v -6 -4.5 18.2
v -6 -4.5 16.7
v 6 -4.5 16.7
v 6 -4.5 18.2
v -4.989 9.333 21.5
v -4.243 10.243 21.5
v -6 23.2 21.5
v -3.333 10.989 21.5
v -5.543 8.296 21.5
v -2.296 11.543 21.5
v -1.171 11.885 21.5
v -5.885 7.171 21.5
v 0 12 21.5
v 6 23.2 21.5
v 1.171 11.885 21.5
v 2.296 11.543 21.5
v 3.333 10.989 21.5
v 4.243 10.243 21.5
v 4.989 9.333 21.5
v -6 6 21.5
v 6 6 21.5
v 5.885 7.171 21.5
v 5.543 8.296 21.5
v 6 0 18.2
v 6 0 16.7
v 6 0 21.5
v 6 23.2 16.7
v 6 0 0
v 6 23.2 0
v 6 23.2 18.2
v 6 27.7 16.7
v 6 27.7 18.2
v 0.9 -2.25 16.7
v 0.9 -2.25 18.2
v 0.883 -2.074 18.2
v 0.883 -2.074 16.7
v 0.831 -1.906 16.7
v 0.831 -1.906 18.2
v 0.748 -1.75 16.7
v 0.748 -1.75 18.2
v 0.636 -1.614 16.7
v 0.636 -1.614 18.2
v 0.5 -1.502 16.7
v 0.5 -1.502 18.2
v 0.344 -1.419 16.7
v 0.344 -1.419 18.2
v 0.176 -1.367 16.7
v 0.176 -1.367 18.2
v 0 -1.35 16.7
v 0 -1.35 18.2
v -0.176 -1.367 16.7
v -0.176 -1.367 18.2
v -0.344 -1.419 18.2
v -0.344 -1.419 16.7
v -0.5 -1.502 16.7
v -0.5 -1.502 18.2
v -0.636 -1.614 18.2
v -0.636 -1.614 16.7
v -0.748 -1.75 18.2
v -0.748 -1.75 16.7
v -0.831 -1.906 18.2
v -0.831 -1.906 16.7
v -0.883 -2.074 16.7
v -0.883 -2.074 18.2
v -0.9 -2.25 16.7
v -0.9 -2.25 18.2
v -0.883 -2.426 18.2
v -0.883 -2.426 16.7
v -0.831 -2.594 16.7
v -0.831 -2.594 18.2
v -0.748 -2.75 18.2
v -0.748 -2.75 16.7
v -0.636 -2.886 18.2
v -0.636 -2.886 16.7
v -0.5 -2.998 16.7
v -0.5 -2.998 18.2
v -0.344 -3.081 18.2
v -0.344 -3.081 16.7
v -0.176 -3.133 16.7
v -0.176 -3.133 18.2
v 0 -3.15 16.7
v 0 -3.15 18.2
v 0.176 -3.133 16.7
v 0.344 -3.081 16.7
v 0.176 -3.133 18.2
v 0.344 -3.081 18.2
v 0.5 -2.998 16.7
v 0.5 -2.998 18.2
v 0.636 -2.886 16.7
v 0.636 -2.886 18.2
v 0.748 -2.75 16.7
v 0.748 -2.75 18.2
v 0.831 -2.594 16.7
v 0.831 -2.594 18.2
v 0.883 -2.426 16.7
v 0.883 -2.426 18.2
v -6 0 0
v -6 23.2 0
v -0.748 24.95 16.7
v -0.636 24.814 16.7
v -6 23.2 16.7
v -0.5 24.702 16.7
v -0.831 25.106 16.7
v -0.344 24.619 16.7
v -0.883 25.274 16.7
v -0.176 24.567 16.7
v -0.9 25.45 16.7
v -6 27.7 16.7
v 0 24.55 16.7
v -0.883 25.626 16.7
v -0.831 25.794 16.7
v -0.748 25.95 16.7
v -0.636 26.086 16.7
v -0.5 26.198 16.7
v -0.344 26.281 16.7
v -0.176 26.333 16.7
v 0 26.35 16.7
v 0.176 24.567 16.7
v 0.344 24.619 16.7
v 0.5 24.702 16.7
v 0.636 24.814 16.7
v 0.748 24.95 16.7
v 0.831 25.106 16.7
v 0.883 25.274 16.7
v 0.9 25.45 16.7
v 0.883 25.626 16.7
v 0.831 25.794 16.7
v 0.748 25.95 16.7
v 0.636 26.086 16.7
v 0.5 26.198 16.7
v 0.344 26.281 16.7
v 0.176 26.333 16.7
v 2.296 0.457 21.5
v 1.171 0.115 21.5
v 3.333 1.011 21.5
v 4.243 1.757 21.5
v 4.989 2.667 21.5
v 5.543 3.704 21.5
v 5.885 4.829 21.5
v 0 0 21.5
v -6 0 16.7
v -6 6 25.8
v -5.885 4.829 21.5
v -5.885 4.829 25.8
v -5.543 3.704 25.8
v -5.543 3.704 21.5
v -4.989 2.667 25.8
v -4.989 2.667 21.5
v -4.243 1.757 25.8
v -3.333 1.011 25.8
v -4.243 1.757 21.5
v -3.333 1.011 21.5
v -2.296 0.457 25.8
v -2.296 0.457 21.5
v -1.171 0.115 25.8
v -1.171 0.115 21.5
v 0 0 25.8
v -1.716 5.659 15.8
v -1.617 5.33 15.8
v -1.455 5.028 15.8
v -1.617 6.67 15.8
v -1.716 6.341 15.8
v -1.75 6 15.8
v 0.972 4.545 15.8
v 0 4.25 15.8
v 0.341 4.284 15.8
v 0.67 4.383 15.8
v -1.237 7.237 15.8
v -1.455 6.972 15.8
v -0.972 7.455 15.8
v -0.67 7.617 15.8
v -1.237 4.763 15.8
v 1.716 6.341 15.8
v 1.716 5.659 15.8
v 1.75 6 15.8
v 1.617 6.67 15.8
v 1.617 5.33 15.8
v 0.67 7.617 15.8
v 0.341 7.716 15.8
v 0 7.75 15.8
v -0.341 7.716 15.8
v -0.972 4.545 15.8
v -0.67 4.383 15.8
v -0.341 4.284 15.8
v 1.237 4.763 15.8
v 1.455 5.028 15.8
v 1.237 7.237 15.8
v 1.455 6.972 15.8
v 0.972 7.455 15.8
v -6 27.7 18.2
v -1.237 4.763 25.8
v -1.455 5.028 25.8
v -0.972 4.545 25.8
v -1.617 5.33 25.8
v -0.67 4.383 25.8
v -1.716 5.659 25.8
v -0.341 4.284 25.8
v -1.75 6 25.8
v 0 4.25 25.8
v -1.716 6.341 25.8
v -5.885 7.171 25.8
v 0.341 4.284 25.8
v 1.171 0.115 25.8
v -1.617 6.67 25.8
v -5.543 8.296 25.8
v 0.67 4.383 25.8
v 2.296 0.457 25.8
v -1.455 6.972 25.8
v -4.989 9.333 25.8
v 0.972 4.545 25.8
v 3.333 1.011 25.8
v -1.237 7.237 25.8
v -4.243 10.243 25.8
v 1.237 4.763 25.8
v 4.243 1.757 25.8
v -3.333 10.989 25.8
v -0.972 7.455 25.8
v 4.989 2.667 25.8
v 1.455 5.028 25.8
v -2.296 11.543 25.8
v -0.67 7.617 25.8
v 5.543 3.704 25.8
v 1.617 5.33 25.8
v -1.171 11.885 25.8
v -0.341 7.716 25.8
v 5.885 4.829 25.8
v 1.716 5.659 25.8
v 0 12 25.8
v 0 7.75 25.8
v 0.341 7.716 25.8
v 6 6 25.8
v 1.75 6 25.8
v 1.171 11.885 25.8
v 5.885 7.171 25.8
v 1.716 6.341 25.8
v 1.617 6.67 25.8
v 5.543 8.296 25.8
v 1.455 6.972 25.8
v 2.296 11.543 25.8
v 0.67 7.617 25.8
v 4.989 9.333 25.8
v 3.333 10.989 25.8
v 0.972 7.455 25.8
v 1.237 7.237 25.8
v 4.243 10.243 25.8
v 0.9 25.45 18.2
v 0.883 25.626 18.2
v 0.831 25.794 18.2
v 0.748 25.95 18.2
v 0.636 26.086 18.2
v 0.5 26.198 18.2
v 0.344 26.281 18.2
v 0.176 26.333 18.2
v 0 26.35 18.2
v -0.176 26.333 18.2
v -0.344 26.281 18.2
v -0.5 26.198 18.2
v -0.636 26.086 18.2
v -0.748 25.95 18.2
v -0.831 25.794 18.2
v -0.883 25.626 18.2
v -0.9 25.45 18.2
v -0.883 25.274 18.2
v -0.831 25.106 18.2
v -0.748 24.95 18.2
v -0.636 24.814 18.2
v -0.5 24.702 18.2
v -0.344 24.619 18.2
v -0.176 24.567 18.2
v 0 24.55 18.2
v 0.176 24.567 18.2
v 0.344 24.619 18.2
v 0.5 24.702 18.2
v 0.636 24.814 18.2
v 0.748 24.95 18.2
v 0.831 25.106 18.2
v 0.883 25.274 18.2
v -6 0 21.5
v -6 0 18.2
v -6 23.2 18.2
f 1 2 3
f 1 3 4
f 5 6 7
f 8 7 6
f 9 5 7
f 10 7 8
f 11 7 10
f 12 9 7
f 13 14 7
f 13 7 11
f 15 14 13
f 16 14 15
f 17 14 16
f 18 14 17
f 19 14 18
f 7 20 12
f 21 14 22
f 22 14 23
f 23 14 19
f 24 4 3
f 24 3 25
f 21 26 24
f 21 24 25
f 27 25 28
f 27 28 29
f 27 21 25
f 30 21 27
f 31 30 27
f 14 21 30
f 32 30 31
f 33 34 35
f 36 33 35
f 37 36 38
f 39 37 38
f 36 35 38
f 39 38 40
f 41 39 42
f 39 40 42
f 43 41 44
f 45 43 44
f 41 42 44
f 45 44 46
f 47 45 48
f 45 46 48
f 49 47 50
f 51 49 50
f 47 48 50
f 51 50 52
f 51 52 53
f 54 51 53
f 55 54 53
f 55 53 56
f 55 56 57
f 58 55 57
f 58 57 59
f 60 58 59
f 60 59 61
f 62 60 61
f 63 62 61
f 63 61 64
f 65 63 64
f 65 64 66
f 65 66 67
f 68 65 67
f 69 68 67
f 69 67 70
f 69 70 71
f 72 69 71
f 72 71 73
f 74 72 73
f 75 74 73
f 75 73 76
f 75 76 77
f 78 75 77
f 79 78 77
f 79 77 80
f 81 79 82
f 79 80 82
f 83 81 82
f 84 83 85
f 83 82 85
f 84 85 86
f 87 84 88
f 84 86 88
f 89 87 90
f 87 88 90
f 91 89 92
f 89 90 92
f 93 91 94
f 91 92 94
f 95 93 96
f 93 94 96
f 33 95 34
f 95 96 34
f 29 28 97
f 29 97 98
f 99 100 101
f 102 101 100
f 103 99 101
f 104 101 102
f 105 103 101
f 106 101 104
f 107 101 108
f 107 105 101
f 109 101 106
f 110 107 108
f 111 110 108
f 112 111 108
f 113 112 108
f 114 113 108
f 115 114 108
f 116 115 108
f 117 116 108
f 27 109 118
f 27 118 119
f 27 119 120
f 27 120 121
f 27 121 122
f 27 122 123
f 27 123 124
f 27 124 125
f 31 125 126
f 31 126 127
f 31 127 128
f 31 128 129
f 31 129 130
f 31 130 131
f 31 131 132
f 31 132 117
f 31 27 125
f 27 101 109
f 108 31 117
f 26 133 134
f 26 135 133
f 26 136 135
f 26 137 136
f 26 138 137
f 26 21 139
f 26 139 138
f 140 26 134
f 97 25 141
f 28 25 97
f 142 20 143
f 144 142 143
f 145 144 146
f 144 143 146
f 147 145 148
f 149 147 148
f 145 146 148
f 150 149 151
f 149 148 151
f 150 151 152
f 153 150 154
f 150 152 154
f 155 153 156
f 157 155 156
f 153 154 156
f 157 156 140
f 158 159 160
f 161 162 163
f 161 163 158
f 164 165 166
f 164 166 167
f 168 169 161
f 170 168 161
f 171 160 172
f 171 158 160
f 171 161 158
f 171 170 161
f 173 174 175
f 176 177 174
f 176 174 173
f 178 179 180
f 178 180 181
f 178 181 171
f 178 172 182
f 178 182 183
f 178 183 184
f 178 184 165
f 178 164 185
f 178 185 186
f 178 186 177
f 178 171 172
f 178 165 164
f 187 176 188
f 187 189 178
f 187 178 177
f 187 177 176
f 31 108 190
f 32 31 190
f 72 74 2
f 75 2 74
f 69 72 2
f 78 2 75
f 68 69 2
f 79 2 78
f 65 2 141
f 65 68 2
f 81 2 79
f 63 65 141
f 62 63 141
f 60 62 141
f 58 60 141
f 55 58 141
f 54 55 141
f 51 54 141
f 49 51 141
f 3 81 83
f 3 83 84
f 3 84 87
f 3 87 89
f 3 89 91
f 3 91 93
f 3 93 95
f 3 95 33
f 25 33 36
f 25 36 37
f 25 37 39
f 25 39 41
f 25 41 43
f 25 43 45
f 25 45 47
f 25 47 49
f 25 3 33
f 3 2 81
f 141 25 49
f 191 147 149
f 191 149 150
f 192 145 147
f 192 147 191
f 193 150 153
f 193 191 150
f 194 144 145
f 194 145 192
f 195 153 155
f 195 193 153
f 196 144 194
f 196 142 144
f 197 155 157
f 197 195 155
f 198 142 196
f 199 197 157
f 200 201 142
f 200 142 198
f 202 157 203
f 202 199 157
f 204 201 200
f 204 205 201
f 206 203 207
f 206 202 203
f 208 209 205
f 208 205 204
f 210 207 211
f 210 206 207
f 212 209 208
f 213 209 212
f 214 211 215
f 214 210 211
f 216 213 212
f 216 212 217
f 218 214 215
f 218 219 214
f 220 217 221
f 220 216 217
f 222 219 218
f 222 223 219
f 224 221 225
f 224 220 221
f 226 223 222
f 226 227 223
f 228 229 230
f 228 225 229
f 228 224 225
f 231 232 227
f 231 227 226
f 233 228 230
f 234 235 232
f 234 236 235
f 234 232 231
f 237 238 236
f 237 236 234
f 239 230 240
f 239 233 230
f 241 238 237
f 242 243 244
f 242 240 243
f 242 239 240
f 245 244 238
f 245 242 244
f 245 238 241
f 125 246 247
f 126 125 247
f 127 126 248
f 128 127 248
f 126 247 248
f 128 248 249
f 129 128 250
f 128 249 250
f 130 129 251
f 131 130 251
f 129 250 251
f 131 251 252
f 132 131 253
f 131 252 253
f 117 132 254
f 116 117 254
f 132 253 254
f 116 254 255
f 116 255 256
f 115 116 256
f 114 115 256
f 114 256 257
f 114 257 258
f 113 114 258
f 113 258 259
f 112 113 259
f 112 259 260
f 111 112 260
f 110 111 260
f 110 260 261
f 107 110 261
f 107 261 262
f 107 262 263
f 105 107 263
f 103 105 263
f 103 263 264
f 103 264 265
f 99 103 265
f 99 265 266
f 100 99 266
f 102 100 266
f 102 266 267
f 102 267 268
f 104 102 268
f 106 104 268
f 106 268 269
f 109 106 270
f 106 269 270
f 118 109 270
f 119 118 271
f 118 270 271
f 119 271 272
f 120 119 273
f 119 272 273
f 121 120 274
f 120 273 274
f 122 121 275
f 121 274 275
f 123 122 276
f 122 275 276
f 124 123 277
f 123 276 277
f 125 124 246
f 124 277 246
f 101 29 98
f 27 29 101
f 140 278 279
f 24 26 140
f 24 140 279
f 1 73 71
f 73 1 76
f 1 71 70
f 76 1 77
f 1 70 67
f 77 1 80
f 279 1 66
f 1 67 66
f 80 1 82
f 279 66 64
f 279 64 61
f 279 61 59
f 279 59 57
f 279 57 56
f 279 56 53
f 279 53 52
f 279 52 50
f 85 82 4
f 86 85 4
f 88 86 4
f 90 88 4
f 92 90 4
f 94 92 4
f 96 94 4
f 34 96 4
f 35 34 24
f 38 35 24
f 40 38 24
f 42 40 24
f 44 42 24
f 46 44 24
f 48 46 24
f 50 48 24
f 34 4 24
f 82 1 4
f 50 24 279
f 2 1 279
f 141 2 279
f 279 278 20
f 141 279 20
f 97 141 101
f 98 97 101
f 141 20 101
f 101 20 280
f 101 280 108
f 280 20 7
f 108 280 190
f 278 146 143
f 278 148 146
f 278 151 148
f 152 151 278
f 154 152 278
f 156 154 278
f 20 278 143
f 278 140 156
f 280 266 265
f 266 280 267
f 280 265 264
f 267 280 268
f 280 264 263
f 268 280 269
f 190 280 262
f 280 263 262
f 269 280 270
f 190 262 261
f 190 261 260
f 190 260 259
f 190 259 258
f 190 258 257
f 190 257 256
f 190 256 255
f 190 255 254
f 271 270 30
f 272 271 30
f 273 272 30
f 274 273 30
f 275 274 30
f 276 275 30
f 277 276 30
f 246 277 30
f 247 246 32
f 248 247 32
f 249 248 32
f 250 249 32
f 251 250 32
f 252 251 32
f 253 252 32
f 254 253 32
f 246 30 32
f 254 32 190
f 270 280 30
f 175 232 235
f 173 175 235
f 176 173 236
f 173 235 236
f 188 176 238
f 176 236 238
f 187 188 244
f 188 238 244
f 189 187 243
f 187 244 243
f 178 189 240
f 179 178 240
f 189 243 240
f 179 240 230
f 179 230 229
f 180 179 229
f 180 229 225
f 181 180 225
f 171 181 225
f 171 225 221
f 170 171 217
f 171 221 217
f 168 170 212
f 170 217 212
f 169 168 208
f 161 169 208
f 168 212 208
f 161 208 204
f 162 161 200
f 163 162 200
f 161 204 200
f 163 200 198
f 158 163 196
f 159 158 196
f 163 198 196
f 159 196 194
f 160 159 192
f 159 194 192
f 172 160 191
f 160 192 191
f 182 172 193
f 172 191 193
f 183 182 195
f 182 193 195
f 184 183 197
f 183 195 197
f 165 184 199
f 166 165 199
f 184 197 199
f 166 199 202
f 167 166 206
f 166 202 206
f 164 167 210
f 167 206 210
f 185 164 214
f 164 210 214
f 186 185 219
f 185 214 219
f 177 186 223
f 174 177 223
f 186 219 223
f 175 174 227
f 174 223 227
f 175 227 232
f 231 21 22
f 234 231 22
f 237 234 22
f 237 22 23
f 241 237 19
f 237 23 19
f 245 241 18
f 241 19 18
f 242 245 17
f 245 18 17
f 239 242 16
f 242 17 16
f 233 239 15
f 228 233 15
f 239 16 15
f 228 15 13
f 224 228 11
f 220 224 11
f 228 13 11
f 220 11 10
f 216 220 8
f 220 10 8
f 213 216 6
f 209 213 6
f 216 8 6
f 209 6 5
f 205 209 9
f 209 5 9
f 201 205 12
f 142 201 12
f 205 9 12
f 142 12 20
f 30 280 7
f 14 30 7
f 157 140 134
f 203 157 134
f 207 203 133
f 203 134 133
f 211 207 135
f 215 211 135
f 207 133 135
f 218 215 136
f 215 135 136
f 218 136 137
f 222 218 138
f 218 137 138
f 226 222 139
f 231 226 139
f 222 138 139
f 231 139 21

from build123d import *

# Parameters (mm, degrees)
F0_W     = 4.5
F0_H     = 1.5
F1_DEPTH = 6
F2_R     = 0.9
F3_DEPTH = 18.201
F5_DEPTH = 4.3
F6_R     = 1.75
F7_DEPTH = 10


with BuildPart() as f1:
    # F0 (on Right) → F1 (new body, symmetric)
    with BuildSketch(Plane.YZ):
        Polygon((23.2, 21.5), (0, 21.5), (0, 18.2), (0, 16.7), (0, 0), (23.2, 0), (23.2, 16.7), (23.2, 18.2), align=None)
        with Locations((-2.25, 17.45)):
            Rectangle(F0_W, F0_H)
        with Locations((25.45, 17.45)):
            Rectangle(F0_W, F0_H)
    extrude(amount=F1_DEPTH, both=True)

    # F2 (on face) → F3 (cut, through all)
    with BuildSketch(Plane.XY.offset(18.2)):
        with Locations((0, -2.25)):
            Circle(F2_R)
        with Locations((0, 25.45)):
            Circle(F2_R)
    extrude(amount=-F3_DEPTH, mode=Mode.SUBTRACT)

    # F4 (on face) → F5 (join)
    with BuildSketch(Plane.XY.offset(21.5)):
        with BuildLine():
            ThreePointArc((0, 0), (4.242641, 1.757359), (6, 6))
            ThreePointArc((6, 6), (0, 12), (-6, 6))
            ThreePointArc((-6, 6), (-4.242641, 1.757359), (0, 0))
        make_face()
    extrude(amount=F5_DEPTH)

    # F6 (on face) → F7 (cut)
    with BuildSketch(Plane.XY.offset(25.8)):
        with Locations((0, 6)):
            Circle(F6_R)
    extrude(amount=-F7_DEPTH, mode=Mode.SUBTRACT)


solid = f1.part
